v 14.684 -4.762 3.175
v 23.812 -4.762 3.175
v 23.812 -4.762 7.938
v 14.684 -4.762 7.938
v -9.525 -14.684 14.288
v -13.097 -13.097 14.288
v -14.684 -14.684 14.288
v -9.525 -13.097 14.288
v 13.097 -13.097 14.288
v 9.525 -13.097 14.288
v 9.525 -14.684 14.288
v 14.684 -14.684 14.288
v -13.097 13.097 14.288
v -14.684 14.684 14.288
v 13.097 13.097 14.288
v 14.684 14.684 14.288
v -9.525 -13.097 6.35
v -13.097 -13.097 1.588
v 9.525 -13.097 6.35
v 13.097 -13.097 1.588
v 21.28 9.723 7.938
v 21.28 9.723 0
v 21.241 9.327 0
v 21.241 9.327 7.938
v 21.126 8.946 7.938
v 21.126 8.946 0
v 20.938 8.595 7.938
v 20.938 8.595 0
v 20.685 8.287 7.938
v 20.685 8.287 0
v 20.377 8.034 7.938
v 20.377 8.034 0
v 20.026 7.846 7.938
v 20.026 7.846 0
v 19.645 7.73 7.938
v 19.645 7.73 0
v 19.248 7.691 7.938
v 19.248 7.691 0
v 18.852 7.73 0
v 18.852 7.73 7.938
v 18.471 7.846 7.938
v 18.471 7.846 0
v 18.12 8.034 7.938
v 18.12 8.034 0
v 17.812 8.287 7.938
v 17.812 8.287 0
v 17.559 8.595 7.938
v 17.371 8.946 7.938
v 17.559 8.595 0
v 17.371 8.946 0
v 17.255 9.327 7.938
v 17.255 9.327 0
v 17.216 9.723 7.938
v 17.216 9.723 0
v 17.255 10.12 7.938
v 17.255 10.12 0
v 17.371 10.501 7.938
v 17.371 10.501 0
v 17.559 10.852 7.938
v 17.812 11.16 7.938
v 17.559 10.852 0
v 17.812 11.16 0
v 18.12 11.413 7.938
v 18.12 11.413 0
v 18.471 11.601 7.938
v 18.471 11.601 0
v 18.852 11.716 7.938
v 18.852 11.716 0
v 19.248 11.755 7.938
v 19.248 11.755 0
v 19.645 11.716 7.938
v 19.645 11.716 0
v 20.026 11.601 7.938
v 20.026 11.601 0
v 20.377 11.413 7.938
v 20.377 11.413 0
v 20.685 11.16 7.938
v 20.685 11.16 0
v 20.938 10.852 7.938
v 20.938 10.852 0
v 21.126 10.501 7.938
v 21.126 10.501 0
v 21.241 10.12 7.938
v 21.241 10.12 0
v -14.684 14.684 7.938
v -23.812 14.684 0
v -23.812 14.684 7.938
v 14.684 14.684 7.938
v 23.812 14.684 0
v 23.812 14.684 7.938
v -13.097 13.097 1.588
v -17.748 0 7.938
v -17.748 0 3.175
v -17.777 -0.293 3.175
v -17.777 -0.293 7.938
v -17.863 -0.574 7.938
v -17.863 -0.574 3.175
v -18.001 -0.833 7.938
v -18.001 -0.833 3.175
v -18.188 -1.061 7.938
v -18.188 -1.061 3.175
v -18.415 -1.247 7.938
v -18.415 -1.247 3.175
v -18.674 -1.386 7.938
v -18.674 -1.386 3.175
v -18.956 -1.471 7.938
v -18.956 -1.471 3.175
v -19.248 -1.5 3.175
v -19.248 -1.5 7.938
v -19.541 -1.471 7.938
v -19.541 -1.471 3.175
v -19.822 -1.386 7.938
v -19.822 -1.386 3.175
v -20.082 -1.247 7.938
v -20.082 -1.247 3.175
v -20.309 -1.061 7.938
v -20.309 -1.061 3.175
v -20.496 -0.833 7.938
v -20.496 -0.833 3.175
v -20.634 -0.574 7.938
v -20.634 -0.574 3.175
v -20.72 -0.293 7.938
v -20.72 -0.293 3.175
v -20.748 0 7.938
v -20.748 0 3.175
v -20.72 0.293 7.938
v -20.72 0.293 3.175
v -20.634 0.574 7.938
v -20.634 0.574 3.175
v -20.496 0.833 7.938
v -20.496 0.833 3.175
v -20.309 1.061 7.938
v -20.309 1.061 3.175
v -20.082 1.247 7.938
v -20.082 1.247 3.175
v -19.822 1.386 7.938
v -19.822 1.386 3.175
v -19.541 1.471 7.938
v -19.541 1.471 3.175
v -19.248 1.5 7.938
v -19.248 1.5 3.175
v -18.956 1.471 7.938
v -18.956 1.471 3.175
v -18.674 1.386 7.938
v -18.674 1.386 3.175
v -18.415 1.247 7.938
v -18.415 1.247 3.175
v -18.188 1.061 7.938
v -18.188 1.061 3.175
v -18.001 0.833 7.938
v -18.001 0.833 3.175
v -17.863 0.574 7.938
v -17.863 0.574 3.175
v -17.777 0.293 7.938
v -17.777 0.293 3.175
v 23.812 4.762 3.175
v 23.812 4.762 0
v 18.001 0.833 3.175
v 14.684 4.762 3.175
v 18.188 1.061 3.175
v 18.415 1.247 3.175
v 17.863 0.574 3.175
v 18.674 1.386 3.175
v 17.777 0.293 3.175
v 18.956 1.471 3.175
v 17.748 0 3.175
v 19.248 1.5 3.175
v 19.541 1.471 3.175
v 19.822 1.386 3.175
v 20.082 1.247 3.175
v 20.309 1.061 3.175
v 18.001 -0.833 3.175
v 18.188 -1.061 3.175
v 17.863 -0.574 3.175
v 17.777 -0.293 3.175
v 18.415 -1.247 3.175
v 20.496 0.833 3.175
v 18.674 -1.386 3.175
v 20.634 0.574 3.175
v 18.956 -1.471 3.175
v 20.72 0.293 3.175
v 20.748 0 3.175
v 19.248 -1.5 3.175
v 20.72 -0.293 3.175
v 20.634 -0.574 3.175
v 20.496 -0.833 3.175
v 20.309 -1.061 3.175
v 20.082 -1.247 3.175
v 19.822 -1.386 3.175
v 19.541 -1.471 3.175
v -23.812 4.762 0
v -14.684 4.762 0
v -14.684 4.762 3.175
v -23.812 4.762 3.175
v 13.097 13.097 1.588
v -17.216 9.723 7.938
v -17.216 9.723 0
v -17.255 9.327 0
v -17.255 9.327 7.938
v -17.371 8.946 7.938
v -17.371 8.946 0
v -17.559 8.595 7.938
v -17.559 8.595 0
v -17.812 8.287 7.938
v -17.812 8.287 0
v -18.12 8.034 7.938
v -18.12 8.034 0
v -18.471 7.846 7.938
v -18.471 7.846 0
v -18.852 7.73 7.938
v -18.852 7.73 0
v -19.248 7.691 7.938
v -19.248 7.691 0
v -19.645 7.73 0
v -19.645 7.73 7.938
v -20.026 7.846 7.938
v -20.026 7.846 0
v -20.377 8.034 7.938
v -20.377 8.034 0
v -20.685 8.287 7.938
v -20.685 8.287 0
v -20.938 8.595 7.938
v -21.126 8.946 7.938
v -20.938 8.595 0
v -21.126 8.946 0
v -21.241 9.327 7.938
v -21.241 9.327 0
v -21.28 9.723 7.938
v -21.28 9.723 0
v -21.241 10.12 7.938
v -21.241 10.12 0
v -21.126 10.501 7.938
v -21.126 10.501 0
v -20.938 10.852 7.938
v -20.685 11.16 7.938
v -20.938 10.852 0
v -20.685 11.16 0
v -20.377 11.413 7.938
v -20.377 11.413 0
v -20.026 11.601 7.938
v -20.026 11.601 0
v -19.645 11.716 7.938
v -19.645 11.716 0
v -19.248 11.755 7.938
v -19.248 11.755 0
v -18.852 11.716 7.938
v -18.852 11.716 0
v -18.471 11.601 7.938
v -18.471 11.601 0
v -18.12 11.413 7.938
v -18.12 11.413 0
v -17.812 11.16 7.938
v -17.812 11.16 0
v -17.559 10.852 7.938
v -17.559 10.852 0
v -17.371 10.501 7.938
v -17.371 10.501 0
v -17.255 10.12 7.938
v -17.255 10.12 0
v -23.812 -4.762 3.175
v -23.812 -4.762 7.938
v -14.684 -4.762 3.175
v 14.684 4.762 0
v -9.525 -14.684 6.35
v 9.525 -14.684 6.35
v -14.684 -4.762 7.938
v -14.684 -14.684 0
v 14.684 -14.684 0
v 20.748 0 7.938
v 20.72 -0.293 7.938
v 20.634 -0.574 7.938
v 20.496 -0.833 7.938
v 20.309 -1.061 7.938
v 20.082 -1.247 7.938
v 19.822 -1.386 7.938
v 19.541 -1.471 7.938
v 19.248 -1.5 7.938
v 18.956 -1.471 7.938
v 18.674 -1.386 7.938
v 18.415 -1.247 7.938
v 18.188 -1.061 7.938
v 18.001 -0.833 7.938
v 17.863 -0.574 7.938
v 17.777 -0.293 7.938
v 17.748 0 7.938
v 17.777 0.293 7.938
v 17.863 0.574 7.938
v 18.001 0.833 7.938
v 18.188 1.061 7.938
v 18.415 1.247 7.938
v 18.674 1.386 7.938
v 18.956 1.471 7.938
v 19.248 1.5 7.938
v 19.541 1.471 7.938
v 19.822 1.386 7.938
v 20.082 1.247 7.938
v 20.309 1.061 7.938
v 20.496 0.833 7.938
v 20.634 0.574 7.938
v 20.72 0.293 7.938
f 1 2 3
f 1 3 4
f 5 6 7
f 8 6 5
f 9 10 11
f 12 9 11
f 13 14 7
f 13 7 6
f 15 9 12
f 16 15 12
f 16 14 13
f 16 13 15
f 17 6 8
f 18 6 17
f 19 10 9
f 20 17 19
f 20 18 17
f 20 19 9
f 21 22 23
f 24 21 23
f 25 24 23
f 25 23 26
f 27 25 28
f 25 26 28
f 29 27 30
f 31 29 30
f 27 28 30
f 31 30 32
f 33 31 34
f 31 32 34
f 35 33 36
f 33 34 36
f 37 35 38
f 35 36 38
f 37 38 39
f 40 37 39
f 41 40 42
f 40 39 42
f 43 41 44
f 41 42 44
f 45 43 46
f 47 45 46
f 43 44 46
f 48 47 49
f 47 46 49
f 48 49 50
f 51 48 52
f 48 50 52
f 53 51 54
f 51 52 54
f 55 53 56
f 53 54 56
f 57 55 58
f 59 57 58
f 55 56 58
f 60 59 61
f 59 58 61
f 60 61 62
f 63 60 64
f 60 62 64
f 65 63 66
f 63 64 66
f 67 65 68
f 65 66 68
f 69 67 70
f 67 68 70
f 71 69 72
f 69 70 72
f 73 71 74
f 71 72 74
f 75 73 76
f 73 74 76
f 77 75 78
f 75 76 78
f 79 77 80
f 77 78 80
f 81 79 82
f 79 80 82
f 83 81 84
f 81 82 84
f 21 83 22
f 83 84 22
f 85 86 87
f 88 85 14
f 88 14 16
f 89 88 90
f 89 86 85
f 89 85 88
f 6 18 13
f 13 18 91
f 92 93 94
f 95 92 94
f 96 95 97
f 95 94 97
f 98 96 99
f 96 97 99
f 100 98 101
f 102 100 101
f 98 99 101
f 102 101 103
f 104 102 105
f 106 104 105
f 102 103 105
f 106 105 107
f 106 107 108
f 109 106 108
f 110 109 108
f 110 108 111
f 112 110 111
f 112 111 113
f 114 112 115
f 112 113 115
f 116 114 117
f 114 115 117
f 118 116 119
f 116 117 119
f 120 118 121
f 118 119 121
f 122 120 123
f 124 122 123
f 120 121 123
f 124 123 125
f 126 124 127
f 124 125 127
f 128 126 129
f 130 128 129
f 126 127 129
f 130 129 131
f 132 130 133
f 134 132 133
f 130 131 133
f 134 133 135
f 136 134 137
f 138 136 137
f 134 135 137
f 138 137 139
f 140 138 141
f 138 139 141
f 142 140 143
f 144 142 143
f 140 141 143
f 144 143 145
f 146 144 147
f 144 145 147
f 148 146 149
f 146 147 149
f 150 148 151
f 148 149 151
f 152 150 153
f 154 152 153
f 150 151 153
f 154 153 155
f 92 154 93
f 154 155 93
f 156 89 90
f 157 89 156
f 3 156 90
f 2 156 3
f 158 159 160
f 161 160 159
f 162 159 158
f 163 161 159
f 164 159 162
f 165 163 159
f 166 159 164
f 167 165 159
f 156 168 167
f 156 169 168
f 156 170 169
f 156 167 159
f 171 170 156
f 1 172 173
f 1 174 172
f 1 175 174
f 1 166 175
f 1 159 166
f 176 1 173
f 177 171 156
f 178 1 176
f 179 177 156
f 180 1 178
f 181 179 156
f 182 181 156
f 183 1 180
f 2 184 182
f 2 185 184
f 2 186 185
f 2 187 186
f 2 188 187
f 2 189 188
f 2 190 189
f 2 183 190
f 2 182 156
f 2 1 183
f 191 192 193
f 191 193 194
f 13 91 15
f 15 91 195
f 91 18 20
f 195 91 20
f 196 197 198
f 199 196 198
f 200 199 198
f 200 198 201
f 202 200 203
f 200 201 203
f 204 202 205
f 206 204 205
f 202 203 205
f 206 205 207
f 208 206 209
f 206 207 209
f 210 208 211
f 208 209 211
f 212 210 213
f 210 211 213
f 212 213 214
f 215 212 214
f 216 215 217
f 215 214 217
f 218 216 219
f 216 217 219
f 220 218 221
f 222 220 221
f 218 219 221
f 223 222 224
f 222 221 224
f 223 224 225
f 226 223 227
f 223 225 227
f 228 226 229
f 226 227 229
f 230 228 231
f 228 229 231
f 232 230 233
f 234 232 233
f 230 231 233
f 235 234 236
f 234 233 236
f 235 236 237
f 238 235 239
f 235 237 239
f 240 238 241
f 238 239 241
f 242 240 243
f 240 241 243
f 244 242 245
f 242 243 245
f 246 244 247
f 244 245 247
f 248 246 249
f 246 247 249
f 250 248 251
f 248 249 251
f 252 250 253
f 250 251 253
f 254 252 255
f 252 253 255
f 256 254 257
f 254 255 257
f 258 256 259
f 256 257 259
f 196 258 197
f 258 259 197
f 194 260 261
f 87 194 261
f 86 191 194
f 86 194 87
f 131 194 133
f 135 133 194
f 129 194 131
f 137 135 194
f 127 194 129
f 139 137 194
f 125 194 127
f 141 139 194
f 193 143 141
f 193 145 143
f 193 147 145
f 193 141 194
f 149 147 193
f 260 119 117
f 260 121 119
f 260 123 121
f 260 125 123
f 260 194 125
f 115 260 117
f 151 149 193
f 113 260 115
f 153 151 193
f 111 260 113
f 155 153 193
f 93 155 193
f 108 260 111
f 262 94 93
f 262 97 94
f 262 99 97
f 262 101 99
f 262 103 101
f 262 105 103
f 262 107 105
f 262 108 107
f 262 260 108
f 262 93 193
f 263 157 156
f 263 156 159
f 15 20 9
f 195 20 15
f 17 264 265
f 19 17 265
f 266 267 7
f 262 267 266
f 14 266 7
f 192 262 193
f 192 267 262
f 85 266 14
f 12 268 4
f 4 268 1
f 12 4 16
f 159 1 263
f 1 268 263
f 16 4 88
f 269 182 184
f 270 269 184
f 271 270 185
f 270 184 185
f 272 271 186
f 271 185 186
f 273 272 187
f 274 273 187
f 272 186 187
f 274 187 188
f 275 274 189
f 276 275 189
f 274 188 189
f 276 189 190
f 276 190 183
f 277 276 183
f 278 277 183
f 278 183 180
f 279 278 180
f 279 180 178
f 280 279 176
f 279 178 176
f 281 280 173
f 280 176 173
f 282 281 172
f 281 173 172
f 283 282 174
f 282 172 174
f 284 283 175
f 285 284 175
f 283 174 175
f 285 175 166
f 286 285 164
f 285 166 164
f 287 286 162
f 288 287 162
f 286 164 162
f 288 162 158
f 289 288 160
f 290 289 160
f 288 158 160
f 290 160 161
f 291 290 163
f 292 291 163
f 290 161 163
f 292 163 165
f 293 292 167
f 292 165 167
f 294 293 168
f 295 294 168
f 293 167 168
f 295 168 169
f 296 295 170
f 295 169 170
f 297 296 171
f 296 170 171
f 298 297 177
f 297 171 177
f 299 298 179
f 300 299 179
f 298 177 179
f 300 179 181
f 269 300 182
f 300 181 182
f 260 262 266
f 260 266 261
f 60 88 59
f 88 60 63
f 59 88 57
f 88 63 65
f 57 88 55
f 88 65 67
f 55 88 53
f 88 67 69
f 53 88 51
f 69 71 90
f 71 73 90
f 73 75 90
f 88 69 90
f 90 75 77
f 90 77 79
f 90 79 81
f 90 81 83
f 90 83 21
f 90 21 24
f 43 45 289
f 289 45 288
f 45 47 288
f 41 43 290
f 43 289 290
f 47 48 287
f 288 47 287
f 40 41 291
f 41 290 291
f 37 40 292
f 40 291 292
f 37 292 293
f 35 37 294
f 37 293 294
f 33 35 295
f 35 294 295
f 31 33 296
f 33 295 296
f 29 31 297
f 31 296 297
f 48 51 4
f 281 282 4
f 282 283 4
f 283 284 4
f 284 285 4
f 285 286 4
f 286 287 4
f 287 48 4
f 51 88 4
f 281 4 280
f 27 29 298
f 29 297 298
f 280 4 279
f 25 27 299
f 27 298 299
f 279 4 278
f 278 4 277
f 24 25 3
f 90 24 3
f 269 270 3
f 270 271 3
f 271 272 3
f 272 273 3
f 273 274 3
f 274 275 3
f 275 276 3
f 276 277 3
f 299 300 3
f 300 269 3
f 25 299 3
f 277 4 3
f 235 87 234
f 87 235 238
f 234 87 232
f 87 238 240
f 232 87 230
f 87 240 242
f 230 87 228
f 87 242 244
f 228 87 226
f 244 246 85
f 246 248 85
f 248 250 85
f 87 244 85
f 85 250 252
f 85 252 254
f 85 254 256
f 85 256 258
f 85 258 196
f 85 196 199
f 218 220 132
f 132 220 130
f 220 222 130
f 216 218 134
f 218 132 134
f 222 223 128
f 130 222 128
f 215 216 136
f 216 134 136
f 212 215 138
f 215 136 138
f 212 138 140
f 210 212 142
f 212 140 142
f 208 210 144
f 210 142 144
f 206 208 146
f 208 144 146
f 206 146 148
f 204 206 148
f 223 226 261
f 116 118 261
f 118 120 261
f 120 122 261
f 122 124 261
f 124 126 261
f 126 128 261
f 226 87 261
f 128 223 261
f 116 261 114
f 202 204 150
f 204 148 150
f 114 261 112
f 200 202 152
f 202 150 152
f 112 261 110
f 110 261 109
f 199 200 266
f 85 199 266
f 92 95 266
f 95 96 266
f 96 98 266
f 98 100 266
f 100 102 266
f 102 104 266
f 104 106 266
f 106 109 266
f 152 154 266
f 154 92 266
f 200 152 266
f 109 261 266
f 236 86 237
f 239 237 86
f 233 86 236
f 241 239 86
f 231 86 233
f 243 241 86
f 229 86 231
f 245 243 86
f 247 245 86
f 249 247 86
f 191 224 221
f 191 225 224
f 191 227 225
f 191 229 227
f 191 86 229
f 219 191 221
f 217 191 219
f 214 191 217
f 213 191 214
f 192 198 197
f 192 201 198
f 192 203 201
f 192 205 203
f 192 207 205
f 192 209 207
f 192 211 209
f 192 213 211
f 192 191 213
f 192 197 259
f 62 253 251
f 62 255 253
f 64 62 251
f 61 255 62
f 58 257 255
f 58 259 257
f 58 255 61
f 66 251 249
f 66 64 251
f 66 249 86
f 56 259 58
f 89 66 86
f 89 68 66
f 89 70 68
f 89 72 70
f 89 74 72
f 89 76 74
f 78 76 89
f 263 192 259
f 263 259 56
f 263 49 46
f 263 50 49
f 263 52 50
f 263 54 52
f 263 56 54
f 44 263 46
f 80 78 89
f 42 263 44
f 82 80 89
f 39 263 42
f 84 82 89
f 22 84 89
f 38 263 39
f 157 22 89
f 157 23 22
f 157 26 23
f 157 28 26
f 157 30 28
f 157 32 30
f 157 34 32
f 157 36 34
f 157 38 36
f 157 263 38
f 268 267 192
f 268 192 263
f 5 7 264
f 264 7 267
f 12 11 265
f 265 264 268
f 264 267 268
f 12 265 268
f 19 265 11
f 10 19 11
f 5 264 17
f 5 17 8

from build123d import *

# Parameters (mm, degrees)
F0_W      = 29.36875
F0_H      = 29.36875
F0_W_2    = 26.19375
F0_H_2    = 26.19375
F1_DEPTH  = 14.2875
F2_W      = 26.19375
F2_H      = 26.19375
F3_DEPTH  = 1.5875
F7_W      = 19.05
F7_H      = 7.9375
F8_DEPTH  = 1.5875
F9_R      = 1.5
F10_DEPTH = 4.7625
F11_R     = 2.032
F12_DEPTH = 7.9375


with BuildPart() as f1:
    # F0 (on Top) → F1 (new body)
    with BuildSketch(Plane.XY):
        Rectangle(F0_W, F0_H)
        Rectangle(F0_W_2, F0_H_2, mode=Mode.SUBTRACT)
    extrude(amount=F1_DEPTH)

    # F2 (on face) → F3 (join)
    with BuildSketch(Plane(origin=(0, 0, 0), x_dir=(1, 0, 0), z_dir=(0, 0, -1))):
        Rectangle(F2_W, F2_H)
    extrude(amount=-F3_DEPTH)

    # F4: union 

    # F7 (on face) → F8 (cut, through all)
    with BuildSketch(Plane.XZ.offset(14.684375)):
        with Locations((0, 10.31875)):
            Rectangle(F7_W, F7_H)
    extrude(amount=-F8_DEPTH, mode=Mode.SUBTRACT)

    # F9 (on face) → F10 (join)
    with BuildSketch(Plane(origin=(0, 0, 3.175), x_dir=(1, 0, 0), z_dir=(0, 0, -1))):
        Polygon((23.8125, 4.7625), (19.2484375, 4.7625), (14.684375, 4.7625), (14.684375, -4.7625), (19.2484375, -4.7625), (23.8125, -4.7625), align=None)
        with Locations((19.2484375, 0)):
            Circle(F9_R, mode=Mode.SUBTRACT)
        Polygon((-19.2484375, -4.7625), (-14.684375, -4.7625), (-14.684375, 4.7625), (-19.2484375, 4.7625), (-23.8125, 4.7625), (-23.8125, -4.7625), align=None)
        with Locations((-19.2484375, 0)):
            Circle(F9_R, mode=Mode.SUBTRACT)
    extrude(amount=-F10_DEPTH)

    # F11 (on face) → F12 (join, through all)
    with BuildSketch(Plane(origin=(0, 0, 0), x_dir=(1, 0, 0), z_dir=(0, 0, -1))):
        Polygon((-23.8125, -14.684375), (-19.2484375, -14.684375), (-14.684375, -14.684375), (-14.684375, -4.7625), (-19.2484375, -4.7625), (-23.8125, -4.7625), align=None)
        with Locations((-19.2484375, -9.7234375)):
            Circle(F11_R, mode=Mode.SUBTRACT)
        Polygon((14.684375, -14.684375), (19.2484375, -14.684375), (23.8125, -14.684375), (23.8125, -4.7625), (19.2484375, -4.7625), (14.684375, -4.7625), align=None)
        with Locations((19.2484375, -9.7234375)):
            Circle(F11_R, mode=Mode.SUBTRACT)
    extrude(amount=-F12_DEPTH)


solid = f1.part
